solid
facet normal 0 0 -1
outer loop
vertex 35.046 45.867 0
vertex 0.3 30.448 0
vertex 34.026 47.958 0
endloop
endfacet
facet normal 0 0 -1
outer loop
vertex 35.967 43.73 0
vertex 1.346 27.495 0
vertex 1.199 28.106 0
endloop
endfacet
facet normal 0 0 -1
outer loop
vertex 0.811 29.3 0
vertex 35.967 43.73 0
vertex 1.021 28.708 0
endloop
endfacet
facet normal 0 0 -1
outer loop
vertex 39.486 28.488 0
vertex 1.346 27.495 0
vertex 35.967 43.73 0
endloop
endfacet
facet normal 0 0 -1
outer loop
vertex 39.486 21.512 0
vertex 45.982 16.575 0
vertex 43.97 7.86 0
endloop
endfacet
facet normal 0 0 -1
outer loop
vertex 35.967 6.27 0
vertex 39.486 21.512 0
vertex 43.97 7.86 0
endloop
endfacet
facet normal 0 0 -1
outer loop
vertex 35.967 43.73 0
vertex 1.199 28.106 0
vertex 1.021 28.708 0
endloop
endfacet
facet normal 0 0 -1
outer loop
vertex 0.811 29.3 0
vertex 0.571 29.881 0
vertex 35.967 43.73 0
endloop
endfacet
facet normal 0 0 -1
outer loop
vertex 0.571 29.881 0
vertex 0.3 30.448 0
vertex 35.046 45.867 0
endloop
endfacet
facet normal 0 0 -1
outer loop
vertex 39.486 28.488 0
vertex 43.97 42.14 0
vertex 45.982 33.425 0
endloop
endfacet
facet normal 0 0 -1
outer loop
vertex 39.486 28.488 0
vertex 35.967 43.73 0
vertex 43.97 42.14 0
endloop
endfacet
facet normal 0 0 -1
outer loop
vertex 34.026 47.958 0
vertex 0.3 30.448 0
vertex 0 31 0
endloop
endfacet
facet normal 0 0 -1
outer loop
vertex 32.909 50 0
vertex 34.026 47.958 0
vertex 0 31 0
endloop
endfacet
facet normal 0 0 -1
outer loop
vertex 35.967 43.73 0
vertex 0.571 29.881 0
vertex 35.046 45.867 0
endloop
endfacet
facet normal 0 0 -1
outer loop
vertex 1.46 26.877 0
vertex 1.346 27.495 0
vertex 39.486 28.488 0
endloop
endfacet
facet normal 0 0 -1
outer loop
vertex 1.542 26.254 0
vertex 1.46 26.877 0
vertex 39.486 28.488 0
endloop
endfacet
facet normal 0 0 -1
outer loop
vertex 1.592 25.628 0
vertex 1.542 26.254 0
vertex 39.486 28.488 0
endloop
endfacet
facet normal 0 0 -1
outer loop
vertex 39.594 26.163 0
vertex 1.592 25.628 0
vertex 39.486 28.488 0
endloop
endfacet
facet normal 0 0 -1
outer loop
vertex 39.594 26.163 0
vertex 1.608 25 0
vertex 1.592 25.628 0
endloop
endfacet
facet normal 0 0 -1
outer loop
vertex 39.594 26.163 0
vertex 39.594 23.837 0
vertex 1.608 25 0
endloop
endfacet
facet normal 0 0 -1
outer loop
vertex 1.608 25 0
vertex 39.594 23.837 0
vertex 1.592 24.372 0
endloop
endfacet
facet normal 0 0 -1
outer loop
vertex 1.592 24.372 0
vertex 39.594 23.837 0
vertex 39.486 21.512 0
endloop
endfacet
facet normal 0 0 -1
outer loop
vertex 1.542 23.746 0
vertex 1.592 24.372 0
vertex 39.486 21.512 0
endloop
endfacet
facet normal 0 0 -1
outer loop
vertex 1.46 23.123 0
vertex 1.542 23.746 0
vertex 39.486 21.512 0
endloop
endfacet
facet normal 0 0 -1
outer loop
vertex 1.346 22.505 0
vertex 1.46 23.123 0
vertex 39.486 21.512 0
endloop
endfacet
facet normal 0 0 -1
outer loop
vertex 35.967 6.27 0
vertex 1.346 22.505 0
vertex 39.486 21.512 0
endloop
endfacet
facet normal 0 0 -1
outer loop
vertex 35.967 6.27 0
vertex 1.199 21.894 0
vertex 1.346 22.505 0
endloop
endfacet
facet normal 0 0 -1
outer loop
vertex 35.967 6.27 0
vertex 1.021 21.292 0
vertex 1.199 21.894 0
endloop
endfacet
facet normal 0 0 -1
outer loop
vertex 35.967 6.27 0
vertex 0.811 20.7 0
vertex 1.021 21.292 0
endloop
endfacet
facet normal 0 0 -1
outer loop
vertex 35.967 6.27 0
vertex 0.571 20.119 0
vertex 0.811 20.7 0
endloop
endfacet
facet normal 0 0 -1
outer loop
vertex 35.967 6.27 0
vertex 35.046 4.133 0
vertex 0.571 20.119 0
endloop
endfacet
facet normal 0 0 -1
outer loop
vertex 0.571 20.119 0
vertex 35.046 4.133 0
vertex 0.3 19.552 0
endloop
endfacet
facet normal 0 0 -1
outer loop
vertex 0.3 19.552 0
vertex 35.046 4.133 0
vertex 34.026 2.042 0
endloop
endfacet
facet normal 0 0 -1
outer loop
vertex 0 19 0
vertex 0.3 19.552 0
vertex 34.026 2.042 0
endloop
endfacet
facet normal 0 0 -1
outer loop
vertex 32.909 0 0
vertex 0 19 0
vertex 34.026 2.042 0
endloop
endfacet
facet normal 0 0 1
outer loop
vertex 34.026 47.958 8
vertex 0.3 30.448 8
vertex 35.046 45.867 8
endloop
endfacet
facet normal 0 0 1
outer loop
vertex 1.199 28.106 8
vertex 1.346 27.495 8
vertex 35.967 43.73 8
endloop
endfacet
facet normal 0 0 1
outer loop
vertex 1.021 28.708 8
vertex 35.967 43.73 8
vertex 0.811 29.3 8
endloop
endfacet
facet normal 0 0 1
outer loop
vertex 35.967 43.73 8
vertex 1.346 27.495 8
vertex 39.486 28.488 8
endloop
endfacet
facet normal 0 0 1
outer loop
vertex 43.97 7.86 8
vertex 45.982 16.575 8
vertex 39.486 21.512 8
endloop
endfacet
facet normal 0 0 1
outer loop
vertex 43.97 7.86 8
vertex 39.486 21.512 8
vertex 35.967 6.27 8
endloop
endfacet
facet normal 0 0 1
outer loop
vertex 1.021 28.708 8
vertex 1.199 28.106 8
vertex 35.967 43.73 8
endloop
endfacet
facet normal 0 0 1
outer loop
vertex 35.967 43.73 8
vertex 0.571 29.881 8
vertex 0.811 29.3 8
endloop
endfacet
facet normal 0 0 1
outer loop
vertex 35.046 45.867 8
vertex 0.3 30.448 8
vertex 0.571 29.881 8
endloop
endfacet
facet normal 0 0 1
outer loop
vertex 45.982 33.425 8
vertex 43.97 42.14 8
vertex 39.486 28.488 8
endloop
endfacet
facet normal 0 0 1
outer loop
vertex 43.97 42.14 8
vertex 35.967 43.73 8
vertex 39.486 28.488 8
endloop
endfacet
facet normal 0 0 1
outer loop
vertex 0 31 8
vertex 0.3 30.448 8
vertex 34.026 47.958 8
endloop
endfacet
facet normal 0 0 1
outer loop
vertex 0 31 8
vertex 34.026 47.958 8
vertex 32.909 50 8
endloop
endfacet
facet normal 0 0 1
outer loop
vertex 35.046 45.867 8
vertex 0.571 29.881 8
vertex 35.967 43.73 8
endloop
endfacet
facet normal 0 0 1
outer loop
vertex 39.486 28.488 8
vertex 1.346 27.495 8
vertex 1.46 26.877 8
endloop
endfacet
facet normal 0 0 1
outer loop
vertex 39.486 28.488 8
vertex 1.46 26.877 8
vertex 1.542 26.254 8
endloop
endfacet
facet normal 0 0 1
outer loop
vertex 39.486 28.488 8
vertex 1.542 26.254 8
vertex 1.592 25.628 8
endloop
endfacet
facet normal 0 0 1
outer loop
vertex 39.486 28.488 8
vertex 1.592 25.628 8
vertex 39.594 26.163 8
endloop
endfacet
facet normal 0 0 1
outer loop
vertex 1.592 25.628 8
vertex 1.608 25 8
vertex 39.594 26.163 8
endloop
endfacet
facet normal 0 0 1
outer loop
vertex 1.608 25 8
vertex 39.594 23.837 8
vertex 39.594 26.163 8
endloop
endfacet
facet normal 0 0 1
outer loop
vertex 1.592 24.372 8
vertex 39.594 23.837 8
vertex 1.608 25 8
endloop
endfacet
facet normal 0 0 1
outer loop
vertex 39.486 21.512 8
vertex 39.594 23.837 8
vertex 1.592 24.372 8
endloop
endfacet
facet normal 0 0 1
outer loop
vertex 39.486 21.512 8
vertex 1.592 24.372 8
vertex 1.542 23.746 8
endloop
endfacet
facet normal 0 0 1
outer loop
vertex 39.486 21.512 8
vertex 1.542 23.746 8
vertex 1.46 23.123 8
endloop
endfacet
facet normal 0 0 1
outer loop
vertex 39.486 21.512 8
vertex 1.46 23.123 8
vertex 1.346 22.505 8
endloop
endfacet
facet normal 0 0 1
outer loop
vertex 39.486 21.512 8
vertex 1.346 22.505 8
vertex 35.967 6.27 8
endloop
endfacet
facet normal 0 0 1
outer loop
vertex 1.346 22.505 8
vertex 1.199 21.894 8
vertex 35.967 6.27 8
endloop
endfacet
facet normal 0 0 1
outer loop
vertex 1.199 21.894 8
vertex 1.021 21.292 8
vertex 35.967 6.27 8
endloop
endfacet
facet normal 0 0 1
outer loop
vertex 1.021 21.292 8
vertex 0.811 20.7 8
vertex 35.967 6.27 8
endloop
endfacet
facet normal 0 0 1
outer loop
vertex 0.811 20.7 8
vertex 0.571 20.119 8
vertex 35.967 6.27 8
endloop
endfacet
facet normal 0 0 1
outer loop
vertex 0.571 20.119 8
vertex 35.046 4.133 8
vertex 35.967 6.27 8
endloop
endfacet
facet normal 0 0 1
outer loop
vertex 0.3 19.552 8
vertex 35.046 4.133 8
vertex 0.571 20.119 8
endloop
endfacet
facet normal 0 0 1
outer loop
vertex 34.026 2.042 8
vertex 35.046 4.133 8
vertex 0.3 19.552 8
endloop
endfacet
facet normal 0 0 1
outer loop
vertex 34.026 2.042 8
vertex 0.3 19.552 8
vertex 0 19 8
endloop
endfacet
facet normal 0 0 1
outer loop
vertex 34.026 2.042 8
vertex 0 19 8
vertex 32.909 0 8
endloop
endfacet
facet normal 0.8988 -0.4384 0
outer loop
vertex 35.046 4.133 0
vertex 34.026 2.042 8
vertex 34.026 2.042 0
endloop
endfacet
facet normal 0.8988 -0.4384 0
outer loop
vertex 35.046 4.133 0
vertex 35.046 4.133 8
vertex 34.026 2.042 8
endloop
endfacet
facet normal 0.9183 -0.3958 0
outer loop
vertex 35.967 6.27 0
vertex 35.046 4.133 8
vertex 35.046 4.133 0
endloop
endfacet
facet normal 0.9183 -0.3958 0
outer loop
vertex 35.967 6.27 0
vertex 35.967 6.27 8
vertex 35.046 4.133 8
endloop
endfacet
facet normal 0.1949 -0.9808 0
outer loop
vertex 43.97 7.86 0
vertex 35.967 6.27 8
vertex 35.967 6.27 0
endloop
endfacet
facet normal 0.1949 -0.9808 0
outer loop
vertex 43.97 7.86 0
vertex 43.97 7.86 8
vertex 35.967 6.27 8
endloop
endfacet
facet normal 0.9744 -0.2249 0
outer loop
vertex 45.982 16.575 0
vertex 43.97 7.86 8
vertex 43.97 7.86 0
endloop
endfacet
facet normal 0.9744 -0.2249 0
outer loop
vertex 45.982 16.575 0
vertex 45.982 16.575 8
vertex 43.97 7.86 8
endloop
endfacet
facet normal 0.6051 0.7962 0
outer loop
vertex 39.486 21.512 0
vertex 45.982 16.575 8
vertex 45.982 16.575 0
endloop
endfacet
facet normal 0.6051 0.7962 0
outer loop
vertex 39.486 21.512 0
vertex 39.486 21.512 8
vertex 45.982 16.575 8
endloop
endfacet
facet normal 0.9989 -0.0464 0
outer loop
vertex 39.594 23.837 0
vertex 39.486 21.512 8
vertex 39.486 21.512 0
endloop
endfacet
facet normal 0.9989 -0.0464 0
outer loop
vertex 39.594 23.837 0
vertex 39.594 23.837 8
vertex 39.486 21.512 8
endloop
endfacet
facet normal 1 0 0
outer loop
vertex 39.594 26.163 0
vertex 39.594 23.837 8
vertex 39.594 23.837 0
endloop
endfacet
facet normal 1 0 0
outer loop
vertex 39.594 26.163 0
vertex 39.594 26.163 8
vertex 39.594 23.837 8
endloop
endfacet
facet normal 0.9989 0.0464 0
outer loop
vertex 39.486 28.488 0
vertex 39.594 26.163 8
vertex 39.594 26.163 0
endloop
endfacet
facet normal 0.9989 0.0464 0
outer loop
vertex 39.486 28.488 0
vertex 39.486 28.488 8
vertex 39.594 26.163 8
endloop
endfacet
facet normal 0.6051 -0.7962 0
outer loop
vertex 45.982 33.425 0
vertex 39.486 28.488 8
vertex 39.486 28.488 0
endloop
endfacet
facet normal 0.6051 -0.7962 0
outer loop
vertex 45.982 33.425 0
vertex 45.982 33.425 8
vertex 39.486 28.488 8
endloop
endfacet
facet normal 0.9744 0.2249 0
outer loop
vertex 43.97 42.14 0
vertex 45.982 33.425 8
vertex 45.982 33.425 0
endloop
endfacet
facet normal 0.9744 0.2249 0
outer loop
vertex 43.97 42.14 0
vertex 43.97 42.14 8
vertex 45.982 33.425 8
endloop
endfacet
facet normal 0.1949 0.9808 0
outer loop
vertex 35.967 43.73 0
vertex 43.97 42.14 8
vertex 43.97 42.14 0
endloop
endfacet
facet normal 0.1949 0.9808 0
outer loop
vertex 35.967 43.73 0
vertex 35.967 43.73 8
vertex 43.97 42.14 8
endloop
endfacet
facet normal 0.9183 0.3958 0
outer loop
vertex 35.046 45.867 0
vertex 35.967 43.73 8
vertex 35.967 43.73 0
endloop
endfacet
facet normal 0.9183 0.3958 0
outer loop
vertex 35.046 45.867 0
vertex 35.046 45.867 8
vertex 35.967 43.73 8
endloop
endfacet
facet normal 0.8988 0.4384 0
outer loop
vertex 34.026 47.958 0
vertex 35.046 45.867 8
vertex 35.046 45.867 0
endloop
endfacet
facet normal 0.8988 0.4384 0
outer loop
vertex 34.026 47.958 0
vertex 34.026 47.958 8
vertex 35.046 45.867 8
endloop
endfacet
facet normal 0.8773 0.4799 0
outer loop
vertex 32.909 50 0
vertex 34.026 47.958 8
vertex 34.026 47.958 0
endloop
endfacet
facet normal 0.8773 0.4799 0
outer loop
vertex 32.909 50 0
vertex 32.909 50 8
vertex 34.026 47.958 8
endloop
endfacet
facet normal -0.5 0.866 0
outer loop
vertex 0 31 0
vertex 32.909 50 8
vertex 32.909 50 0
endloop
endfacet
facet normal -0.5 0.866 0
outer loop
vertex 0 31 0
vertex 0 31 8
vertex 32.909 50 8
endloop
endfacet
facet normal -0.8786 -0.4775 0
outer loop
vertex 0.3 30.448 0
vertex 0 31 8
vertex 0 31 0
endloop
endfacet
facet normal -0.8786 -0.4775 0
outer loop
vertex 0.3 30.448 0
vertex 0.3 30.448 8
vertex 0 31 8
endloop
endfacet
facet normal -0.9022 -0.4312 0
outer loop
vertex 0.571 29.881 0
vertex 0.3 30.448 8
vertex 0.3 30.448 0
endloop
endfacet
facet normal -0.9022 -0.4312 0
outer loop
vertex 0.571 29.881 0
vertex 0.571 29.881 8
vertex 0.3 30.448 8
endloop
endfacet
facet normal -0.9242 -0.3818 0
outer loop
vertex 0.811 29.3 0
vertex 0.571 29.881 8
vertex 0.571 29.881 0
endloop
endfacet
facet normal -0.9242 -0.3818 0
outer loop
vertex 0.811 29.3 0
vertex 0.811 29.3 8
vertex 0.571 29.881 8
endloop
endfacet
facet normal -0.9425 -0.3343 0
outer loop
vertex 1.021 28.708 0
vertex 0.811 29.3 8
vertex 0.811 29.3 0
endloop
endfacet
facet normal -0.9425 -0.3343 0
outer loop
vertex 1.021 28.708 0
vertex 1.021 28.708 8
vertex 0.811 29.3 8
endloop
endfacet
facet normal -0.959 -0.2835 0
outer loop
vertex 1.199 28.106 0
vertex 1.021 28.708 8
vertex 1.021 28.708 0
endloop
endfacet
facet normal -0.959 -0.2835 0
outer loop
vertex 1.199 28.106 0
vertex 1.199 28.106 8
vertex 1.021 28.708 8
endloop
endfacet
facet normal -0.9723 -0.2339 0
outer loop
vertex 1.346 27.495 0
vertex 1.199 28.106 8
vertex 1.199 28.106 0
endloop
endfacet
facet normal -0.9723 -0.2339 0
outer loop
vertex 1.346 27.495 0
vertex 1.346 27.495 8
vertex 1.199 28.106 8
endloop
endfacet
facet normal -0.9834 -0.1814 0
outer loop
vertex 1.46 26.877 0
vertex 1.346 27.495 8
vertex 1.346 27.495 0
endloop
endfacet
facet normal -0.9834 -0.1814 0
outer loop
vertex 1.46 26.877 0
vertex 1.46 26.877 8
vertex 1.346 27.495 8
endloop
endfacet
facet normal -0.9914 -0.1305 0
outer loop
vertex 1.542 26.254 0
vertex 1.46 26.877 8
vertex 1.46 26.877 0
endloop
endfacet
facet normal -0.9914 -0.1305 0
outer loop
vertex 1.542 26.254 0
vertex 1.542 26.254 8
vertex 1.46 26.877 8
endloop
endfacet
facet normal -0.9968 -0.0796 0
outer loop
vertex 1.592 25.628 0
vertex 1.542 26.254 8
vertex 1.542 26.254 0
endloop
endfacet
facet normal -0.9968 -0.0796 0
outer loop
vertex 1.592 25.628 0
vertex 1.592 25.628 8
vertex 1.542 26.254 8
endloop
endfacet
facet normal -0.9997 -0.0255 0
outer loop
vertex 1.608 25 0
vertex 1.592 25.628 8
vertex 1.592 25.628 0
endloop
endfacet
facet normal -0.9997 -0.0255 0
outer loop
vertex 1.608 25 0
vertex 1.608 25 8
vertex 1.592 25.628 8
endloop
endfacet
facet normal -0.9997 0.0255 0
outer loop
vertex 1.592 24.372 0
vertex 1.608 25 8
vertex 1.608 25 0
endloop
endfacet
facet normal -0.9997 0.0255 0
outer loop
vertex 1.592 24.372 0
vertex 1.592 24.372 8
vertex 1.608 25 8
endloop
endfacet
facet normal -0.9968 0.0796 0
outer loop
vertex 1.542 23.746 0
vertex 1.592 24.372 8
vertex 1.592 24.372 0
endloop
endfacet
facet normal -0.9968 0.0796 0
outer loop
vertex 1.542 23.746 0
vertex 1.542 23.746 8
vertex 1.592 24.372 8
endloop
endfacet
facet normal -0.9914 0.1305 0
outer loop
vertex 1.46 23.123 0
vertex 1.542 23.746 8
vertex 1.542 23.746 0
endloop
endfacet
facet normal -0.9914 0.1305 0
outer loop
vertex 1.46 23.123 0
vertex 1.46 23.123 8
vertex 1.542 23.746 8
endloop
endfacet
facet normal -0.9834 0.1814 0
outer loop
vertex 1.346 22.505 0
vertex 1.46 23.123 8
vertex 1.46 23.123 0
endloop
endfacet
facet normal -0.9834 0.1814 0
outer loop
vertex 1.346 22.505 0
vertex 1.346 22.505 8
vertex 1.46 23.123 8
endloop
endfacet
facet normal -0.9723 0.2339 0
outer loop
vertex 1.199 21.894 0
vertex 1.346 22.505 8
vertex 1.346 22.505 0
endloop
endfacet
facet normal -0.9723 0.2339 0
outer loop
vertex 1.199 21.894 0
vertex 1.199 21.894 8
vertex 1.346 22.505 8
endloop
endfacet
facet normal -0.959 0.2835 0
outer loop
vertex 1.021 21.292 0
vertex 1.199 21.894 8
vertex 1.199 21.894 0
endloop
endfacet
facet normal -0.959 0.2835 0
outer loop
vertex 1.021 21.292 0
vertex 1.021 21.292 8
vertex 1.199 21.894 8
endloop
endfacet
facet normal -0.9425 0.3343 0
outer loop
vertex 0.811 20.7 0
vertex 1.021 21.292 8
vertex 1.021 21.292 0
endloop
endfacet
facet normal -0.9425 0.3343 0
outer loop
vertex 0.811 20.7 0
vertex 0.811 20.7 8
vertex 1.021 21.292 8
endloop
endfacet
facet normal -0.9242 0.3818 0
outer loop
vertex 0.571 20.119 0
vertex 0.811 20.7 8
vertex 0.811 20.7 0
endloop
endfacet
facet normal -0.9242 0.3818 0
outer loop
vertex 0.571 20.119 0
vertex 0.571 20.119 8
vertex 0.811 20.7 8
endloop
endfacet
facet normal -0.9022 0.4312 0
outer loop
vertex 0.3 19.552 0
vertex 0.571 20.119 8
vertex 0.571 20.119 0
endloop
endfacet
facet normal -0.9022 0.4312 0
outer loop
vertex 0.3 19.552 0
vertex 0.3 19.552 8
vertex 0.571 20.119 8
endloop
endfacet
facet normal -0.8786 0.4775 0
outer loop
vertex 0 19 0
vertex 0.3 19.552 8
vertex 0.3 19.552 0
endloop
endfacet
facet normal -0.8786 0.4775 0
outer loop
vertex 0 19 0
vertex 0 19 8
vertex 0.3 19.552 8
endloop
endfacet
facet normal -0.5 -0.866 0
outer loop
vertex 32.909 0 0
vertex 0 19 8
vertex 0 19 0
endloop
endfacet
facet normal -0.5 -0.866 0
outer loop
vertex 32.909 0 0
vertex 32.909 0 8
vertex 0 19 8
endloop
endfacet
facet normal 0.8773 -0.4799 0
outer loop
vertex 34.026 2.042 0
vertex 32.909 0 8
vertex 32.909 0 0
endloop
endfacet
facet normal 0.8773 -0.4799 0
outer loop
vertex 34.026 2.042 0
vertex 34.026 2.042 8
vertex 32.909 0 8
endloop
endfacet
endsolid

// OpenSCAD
$fn = 32;

// ----------------------------------------------------------------------
// Gear sector: 2 teeth on 60 degrees
// ----------------------------------------------------------------------

// --- parameters (mm) ---
sector_angle = 60;        // sector angle, degrees
root_r = 50;              // root circle radius
tooth_h = 7;              // tooth height over the root circle
teeth = 2;                // number of teeth on the sector
hub_r = 12;               // hub bore radius
plate_t = 8;              // sector thickness, Z
arc_step = 3;             // sampling step of the root/hub arcs, degrees

tip_r = root_r + tooth_h;  // tip circle radius

profile = [[32.909, 0], [34.026, 2.042], [35.046, 4.133], [35.967, 6.27], [43.97, 7.86], [45.982, 16.575], [39.486, 21.512], [39.594, 23.837], [39.594, 26.163], [39.486, 28.488], [45.982, 33.425], [43.97, 42.14], [35.967, 43.73], [35.046, 45.867], [34.026, 47.958], [32.909, 50], [0, 31], [0.3, 30.448], [0.571, 29.881], [0.811, 29.3], [1.021, 28.708], [1.199, 28.106], [1.346, 27.495], [1.46, 26.877], [1.542, 26.254], [1.592, 25.628], [1.608, 25], [1.592, 24.372], [1.542, 23.746], [1.46, 23.123], [1.346, 22.505], [1.199, 21.894], [1.021, 21.292], [0.811, 20.7], [0.571, 20.119], [0.3, 19.552], [0, 19]];  // primary outline, 37 points, counter clockwise

// --- the one profile operation ---
linear_extrude(height = plate_t) polygon(points = profile);
